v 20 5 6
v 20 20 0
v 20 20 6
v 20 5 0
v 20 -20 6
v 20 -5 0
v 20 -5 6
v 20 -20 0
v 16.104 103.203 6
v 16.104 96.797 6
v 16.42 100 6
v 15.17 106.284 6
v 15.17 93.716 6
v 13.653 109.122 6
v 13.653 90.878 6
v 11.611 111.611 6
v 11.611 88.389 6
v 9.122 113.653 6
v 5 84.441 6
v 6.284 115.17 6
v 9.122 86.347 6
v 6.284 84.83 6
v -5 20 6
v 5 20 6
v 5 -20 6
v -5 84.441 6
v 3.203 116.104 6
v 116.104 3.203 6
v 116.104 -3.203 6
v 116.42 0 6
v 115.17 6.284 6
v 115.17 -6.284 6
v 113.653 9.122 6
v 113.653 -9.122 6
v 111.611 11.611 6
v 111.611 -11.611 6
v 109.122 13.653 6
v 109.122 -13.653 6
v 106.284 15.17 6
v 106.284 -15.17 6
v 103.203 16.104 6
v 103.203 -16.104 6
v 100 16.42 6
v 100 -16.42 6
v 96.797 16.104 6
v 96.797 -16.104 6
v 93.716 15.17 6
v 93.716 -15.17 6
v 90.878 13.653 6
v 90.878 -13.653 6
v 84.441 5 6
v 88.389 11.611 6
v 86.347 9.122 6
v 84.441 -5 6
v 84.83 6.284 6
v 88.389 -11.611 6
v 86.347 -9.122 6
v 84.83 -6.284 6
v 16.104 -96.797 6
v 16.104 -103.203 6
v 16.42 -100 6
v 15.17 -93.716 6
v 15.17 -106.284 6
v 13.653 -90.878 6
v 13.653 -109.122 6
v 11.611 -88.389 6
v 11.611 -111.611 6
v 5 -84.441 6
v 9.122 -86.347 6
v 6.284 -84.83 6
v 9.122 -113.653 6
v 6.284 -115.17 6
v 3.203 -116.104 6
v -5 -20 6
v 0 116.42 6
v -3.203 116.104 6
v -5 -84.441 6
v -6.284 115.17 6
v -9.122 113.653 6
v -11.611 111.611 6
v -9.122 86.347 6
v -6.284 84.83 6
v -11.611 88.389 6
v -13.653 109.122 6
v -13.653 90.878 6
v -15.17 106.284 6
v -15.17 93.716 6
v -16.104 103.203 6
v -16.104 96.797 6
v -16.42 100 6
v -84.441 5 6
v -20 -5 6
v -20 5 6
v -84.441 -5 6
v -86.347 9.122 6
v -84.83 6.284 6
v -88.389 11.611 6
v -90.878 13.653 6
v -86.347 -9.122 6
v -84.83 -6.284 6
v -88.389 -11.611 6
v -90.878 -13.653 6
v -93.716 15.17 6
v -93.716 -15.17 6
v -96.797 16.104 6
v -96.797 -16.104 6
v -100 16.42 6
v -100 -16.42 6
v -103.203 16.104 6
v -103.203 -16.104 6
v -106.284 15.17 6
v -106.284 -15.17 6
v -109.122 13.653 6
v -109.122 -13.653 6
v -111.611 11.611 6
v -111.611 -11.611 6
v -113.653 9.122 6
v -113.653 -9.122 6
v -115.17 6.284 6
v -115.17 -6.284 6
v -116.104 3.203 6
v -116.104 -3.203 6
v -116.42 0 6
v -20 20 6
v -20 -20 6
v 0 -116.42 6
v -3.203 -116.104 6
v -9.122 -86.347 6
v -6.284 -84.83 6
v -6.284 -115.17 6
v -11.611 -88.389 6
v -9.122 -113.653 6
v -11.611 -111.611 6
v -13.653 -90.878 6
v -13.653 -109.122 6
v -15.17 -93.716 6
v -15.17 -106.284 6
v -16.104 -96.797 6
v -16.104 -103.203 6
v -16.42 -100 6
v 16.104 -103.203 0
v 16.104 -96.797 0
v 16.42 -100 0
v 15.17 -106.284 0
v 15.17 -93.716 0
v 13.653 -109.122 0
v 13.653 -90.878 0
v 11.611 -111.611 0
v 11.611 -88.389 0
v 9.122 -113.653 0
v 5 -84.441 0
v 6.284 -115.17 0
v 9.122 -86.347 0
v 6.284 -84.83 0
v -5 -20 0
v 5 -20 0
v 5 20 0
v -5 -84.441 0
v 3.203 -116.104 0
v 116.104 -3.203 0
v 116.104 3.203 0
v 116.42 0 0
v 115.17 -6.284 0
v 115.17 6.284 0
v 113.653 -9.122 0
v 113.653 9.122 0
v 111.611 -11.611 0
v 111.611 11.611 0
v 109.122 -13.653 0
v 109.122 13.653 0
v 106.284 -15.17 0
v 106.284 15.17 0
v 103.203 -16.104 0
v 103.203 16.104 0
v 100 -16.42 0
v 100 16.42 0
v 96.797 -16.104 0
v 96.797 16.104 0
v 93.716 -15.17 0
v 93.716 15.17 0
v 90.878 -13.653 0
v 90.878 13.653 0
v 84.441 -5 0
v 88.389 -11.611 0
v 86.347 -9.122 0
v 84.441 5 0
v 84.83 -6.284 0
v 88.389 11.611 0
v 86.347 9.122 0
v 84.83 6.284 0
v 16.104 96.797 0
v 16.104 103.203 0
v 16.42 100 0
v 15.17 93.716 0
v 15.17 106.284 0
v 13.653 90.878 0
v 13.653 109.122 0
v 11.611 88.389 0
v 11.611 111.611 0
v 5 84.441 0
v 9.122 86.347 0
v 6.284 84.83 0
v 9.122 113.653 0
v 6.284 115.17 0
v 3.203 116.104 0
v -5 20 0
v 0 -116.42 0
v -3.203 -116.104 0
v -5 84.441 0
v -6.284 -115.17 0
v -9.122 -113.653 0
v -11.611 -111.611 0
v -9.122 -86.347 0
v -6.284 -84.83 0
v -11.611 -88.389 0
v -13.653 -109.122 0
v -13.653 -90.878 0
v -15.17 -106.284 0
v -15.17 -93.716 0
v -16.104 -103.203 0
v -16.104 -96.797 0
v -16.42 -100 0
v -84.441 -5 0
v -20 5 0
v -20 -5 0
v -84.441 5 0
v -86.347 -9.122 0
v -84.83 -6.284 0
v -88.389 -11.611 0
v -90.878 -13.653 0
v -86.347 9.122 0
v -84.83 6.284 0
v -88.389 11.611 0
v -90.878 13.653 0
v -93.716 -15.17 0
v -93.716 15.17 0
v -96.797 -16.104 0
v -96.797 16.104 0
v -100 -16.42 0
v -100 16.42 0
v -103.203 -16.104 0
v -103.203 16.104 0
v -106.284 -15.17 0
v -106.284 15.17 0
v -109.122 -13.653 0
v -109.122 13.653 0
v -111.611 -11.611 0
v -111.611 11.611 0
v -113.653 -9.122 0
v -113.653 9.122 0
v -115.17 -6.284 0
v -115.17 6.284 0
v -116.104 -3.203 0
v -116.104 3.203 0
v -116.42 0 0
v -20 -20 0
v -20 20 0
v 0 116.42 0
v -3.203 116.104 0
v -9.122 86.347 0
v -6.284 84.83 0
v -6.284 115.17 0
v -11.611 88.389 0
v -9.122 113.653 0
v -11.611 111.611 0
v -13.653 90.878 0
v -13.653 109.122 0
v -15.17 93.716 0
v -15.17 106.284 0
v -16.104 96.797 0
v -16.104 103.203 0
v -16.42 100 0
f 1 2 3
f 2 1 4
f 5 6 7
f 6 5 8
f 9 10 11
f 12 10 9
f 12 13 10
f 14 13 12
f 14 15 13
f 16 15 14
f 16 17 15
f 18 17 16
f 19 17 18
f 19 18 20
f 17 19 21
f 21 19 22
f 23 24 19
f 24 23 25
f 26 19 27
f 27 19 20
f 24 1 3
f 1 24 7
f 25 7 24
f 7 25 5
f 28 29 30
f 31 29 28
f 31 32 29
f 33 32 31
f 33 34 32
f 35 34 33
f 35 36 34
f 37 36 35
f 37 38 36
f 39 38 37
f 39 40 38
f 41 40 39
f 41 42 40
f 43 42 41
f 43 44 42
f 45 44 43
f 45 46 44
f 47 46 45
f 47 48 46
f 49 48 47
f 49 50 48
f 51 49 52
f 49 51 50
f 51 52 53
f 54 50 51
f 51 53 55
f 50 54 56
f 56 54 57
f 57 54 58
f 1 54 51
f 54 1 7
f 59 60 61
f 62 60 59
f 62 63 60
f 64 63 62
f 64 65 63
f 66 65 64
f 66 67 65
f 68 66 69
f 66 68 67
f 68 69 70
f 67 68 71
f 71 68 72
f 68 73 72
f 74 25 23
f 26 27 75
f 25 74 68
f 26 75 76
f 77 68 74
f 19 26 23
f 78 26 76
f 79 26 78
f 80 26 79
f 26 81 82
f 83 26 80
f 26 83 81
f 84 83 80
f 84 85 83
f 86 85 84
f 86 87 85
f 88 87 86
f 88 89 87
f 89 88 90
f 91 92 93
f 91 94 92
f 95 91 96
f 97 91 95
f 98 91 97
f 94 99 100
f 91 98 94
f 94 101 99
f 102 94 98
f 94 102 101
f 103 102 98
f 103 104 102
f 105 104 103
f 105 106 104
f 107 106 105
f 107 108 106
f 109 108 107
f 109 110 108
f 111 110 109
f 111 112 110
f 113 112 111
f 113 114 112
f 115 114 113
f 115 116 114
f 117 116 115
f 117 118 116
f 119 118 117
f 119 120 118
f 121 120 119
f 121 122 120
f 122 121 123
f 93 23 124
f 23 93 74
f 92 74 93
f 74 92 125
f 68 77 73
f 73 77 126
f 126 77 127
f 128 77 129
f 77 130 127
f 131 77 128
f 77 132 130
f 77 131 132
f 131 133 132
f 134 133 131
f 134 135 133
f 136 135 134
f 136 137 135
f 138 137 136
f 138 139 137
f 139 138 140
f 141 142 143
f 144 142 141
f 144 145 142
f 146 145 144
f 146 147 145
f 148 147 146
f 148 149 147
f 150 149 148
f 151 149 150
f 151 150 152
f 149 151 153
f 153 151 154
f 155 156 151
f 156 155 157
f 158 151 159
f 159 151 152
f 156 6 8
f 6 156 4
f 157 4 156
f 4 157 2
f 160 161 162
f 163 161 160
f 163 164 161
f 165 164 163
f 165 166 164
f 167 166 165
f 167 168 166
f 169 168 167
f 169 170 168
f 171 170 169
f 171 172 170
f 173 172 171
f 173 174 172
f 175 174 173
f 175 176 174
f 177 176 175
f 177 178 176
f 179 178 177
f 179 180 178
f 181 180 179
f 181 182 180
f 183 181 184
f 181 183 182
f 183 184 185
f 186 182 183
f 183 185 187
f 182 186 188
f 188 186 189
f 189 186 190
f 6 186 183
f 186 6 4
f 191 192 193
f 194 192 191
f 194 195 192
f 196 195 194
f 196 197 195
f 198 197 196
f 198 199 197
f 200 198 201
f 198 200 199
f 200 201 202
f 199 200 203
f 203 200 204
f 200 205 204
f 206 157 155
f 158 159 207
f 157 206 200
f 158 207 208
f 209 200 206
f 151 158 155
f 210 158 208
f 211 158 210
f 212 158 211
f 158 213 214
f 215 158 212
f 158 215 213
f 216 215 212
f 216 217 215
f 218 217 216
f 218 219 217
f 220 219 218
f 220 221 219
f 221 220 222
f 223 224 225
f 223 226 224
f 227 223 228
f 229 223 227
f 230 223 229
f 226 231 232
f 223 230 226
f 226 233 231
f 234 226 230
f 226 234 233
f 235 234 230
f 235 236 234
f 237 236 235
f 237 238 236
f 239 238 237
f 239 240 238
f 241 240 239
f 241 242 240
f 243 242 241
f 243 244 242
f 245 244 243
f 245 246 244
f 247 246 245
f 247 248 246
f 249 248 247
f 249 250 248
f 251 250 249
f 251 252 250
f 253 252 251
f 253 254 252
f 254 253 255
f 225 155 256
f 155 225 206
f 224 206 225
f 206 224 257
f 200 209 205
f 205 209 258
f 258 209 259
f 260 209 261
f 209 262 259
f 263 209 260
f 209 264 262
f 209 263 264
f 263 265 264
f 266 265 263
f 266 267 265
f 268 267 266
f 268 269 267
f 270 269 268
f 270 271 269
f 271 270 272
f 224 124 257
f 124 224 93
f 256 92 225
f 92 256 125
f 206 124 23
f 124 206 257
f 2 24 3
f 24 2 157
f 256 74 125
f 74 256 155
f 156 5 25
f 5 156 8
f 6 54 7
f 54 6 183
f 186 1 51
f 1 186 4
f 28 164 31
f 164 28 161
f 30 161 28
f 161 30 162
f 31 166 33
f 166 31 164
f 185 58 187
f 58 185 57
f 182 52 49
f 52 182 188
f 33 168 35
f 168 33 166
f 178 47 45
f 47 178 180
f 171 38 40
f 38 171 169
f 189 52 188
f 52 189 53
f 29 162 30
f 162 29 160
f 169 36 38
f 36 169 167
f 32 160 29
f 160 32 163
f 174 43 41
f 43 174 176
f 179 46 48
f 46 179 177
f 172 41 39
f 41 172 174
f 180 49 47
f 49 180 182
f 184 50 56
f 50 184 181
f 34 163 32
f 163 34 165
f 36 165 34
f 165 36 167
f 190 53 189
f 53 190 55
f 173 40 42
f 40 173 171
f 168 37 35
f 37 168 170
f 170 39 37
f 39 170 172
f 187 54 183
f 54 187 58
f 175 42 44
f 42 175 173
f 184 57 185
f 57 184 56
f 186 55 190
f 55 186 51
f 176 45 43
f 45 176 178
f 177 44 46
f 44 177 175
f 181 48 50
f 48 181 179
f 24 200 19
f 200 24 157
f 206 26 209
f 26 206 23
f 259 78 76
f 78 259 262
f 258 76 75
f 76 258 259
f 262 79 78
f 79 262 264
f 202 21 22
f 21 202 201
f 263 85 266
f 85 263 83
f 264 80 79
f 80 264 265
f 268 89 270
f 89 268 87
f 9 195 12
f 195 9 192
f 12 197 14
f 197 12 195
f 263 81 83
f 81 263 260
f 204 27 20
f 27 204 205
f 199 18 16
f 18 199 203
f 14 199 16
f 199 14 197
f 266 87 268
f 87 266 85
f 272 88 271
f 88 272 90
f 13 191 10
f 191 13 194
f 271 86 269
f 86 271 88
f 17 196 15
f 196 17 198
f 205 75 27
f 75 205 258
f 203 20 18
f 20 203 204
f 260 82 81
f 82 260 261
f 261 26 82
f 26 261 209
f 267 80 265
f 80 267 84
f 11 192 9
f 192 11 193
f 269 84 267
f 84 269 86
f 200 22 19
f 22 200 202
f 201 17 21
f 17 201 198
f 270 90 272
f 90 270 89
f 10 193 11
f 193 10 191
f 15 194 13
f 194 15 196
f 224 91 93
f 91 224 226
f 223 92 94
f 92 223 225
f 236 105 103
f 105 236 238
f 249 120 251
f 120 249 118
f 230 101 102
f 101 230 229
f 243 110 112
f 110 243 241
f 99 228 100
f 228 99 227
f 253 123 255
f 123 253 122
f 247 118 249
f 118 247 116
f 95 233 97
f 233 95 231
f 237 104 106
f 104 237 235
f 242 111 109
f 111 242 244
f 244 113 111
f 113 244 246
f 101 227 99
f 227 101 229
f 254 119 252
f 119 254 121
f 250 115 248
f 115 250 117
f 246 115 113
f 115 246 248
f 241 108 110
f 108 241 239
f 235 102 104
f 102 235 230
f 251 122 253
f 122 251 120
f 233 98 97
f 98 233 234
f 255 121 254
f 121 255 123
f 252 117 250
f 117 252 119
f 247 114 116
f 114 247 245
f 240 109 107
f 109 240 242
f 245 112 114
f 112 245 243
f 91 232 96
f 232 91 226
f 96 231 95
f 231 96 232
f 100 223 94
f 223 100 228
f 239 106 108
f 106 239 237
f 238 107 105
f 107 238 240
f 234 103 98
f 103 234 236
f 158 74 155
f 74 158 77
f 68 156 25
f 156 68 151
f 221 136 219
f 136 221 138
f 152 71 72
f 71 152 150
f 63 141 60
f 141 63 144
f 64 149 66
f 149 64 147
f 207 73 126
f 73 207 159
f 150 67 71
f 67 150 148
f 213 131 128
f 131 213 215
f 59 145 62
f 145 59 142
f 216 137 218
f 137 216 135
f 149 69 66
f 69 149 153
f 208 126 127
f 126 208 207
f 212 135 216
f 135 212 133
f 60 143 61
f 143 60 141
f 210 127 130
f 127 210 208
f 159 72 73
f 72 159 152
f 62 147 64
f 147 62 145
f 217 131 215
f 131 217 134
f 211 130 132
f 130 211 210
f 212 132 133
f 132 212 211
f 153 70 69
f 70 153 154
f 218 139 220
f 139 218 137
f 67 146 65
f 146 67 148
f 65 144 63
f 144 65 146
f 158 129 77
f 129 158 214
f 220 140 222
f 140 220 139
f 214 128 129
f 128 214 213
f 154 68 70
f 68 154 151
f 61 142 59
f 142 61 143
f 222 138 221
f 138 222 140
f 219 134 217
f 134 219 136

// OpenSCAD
$fn = 32;

// ----------------------------------------------------------------------
// Quadcopter frame: 232.84 mm across the motor pads, arms 100 mm
// ----------------------------------------------------------------------

// --- parameters (mm) ---
hub = 40;                 // central plate size
plate_t = 6;              // plate thickness
arm_len = 100;            // hub centre to motor pad centre
bar_w = 10;               // arm width
pad_d = 32.84;            // motor pad diameter

module arm_bar() {
  /* flat bar: hull of a stub inside the hub and a box at the pad */
  hull() {
    translate([hub / 4, 0, plate_t / 2]) cube([bar_w, bar_w, plate_t], center = true);
    translate([arm_len, 0, plate_t / 2]) cube([bar_w, bar_w, plate_t], center = true);
  }
}

module pad() {
  translate([arm_len, 0, 0]) cylinder(h = plate_t, d = pad_d);
}

module frame() {
  translate([-hub / 2, -hub / 2, 0]) cube([hub, hub, plate_t]);
  rotate([0, 0, 0]) arm_bar();
  rotate([0, 0, 0]) pad();
  rotate([0, 0, 90]) arm_bar();
  rotate([0, 0, 90]) pad();
  rotate([0, 0, 180]) arm_bar();
  rotate([0, 0, 180]) pad();
  rotate([0, 0, 270]) arm_bar();
  rotate([0, 0, 270]) pad();
}

difference() {
  frame();
}
